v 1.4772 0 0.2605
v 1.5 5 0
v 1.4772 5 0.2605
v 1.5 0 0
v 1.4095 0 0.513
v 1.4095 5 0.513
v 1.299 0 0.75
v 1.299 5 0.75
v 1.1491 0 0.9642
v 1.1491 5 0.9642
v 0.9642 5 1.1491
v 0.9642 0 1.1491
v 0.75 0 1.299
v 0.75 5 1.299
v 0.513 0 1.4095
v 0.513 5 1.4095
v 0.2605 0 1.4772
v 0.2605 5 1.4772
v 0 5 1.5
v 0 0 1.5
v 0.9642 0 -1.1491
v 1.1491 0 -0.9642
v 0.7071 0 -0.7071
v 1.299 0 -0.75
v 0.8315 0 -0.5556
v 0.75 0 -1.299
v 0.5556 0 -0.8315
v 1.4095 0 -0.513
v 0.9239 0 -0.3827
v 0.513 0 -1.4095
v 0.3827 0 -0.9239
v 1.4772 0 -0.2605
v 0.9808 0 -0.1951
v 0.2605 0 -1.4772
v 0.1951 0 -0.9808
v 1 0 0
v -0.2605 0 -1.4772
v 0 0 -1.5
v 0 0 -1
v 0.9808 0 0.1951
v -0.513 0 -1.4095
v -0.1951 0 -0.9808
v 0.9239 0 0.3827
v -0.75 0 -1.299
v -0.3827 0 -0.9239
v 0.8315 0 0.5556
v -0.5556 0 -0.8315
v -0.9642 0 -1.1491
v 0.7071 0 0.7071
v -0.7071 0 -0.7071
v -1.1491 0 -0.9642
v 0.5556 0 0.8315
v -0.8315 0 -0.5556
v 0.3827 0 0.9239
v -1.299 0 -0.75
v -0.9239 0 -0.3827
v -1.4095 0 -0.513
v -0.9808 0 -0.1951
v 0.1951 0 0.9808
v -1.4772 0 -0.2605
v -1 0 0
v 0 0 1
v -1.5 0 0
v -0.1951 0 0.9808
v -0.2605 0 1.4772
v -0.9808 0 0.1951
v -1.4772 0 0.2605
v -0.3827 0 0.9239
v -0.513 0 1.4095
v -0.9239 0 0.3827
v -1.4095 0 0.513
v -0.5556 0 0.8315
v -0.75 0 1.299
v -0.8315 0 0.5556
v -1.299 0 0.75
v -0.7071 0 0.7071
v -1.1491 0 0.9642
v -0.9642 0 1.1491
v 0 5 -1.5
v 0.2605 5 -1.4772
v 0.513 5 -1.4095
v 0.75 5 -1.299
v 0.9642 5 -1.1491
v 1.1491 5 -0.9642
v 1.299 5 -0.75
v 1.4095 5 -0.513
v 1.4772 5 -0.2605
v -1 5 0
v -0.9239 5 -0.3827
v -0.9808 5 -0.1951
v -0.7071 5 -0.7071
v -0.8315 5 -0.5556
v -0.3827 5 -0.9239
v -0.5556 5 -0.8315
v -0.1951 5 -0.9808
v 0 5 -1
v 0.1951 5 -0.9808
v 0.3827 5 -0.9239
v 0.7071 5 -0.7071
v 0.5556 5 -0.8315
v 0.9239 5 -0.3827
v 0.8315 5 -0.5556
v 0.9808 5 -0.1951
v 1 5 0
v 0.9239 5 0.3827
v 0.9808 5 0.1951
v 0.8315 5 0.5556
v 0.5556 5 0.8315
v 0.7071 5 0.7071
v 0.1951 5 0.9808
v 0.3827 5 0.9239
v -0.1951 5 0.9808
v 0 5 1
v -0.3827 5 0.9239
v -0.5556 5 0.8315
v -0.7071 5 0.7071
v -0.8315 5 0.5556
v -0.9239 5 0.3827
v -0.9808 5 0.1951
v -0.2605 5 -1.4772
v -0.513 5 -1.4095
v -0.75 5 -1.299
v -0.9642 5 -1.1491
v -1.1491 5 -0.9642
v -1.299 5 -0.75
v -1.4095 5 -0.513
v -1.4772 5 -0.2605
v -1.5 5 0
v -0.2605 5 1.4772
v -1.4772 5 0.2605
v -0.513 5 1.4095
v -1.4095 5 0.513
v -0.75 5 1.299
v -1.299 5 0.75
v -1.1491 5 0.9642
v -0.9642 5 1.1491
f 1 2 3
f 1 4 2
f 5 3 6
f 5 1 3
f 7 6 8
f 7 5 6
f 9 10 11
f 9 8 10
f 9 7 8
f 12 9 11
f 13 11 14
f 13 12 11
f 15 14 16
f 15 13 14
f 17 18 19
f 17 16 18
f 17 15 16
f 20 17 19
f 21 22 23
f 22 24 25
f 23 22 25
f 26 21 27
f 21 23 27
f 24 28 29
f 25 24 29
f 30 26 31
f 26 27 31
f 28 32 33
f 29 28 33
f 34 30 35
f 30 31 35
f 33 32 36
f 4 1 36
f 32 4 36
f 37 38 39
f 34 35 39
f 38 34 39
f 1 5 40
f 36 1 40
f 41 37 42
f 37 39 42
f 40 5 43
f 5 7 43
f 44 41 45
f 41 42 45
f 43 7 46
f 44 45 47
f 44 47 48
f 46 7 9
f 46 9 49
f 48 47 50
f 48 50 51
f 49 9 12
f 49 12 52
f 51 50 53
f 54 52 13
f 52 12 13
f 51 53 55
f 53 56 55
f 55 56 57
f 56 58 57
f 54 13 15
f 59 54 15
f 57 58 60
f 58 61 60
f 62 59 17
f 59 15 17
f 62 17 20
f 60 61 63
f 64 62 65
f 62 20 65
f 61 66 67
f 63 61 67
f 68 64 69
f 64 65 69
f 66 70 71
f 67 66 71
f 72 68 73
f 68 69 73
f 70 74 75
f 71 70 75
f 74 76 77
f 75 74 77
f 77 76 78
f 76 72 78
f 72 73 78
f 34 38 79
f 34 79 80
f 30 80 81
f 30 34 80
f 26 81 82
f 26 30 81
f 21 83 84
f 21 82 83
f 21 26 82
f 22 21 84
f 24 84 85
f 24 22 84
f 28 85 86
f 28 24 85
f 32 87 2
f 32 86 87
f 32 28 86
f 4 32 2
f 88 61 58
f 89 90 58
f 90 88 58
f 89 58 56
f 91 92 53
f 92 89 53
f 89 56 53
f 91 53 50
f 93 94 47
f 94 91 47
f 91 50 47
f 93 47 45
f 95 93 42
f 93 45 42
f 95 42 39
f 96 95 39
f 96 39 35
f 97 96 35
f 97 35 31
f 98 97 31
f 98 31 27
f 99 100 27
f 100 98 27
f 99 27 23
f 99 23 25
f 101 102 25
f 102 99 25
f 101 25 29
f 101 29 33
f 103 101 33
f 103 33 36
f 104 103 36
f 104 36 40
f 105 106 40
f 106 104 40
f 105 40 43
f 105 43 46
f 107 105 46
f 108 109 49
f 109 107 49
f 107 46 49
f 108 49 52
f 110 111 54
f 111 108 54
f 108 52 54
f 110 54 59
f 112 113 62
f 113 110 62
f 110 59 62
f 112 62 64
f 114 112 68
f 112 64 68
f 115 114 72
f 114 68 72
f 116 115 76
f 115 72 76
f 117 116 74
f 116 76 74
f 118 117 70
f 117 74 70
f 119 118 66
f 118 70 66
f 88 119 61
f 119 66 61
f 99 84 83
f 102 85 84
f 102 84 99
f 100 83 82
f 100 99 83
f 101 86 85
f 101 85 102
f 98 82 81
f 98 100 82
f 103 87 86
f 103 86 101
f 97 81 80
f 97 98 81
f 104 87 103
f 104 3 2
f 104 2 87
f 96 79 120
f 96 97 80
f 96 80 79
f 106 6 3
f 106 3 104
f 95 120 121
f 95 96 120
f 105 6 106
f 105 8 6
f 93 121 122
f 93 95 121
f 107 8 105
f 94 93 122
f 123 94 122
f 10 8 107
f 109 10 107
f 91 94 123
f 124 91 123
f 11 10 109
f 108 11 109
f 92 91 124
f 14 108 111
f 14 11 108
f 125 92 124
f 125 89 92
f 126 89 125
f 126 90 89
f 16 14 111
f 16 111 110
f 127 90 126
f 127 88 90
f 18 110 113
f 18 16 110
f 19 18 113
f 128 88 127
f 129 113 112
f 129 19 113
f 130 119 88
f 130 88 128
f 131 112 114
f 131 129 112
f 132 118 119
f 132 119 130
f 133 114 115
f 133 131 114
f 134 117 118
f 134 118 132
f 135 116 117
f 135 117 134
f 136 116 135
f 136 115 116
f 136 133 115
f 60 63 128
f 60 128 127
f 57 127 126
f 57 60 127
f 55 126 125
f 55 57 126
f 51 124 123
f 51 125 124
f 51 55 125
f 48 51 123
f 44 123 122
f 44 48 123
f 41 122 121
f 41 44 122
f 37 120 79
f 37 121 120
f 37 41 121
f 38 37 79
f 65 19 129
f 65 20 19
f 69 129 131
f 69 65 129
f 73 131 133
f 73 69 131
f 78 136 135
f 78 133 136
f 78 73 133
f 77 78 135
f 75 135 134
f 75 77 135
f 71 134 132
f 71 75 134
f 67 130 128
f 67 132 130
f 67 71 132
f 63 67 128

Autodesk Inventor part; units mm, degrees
ref_plane "YZ Plane" through (0, 0, 0) normal (1, 0, 0) x (0, 1, 0)
ref_plane "XZ Plane" through (0, 0, 0) normal (0, 1, 0) x (-1, 0, 0)
ref_plane "XY Plane" through (0, 0, 0) normal (0, 0, 1) x (1, 0, 0)
sketch "Sketch1" plane through (0, 0, 0) normal (0, 1, 0) x (-1, 0, 0)
  line L0 (3.5364, -1.5) -> (3.5, -1.5)
  line L1 (1.5, 3.5) -> (1.5, 3.5)
  line L2 (3.5, 1.5) -> (3.5, 1.5)
  line L3 (-1.5, 3.5) -> (-1.5, 3.5364)
  line L4 (-1.5, -1.5) -> (1.5, 1.5) construction
  line L5 (1.5, -1.5) -> (-1.5, 1.5) construction
  circle A0 centre (0, 0) radius 1
  line L6 (0, 1.5) -> (0, 1.5)
  line L7 (1.5, 0) -> (1.5, 0)
  line L8 (0, -1.5) -> (0, -1.5)
  line L9 (-1.5, 0) -> (-1.5, 0)
  arc A1 (0, 1.5) -> (-1.5, 0) centre (0, 0) ccw
  arc A2 (-1.5, 0) -> (0, -1.5) centre (0, 0) ccw
  arc A3 (0, -1.5) -> (1.5, 0) centre (0, 0) ccw
  arc A4 (1.5, 0) -> (0, 1.5) centre (0, 0) ccw
  point P0 (-1.5, 0)
  dimension "d46" = 2
  dimension "d48" = 3
  dimension "d49" = 3
  dimension "d50" = 1.5
extrude "Extrusion1" add sketch "Sketch1" along normal blind 5
equation "\"BendRadius\" = Thickness"
equation "\"BendReliefWidth\" = Thickness"
equation "\"BendReliefDepth\" = 0.5 * Thickness"
equation "\"CornerReliefSize\" = 4 * Thickness"
equation "\"MinimumRemnant\" = 2 * Thickness"
equation "\"TransitionRadius\" = BendRadius"
equation "\"JacobiRadiusSize\" = BendRadius"
equation "\"GapSize\" = Thickness"
equation "\"Thickness\" = 3.048"
properties part number "base"
